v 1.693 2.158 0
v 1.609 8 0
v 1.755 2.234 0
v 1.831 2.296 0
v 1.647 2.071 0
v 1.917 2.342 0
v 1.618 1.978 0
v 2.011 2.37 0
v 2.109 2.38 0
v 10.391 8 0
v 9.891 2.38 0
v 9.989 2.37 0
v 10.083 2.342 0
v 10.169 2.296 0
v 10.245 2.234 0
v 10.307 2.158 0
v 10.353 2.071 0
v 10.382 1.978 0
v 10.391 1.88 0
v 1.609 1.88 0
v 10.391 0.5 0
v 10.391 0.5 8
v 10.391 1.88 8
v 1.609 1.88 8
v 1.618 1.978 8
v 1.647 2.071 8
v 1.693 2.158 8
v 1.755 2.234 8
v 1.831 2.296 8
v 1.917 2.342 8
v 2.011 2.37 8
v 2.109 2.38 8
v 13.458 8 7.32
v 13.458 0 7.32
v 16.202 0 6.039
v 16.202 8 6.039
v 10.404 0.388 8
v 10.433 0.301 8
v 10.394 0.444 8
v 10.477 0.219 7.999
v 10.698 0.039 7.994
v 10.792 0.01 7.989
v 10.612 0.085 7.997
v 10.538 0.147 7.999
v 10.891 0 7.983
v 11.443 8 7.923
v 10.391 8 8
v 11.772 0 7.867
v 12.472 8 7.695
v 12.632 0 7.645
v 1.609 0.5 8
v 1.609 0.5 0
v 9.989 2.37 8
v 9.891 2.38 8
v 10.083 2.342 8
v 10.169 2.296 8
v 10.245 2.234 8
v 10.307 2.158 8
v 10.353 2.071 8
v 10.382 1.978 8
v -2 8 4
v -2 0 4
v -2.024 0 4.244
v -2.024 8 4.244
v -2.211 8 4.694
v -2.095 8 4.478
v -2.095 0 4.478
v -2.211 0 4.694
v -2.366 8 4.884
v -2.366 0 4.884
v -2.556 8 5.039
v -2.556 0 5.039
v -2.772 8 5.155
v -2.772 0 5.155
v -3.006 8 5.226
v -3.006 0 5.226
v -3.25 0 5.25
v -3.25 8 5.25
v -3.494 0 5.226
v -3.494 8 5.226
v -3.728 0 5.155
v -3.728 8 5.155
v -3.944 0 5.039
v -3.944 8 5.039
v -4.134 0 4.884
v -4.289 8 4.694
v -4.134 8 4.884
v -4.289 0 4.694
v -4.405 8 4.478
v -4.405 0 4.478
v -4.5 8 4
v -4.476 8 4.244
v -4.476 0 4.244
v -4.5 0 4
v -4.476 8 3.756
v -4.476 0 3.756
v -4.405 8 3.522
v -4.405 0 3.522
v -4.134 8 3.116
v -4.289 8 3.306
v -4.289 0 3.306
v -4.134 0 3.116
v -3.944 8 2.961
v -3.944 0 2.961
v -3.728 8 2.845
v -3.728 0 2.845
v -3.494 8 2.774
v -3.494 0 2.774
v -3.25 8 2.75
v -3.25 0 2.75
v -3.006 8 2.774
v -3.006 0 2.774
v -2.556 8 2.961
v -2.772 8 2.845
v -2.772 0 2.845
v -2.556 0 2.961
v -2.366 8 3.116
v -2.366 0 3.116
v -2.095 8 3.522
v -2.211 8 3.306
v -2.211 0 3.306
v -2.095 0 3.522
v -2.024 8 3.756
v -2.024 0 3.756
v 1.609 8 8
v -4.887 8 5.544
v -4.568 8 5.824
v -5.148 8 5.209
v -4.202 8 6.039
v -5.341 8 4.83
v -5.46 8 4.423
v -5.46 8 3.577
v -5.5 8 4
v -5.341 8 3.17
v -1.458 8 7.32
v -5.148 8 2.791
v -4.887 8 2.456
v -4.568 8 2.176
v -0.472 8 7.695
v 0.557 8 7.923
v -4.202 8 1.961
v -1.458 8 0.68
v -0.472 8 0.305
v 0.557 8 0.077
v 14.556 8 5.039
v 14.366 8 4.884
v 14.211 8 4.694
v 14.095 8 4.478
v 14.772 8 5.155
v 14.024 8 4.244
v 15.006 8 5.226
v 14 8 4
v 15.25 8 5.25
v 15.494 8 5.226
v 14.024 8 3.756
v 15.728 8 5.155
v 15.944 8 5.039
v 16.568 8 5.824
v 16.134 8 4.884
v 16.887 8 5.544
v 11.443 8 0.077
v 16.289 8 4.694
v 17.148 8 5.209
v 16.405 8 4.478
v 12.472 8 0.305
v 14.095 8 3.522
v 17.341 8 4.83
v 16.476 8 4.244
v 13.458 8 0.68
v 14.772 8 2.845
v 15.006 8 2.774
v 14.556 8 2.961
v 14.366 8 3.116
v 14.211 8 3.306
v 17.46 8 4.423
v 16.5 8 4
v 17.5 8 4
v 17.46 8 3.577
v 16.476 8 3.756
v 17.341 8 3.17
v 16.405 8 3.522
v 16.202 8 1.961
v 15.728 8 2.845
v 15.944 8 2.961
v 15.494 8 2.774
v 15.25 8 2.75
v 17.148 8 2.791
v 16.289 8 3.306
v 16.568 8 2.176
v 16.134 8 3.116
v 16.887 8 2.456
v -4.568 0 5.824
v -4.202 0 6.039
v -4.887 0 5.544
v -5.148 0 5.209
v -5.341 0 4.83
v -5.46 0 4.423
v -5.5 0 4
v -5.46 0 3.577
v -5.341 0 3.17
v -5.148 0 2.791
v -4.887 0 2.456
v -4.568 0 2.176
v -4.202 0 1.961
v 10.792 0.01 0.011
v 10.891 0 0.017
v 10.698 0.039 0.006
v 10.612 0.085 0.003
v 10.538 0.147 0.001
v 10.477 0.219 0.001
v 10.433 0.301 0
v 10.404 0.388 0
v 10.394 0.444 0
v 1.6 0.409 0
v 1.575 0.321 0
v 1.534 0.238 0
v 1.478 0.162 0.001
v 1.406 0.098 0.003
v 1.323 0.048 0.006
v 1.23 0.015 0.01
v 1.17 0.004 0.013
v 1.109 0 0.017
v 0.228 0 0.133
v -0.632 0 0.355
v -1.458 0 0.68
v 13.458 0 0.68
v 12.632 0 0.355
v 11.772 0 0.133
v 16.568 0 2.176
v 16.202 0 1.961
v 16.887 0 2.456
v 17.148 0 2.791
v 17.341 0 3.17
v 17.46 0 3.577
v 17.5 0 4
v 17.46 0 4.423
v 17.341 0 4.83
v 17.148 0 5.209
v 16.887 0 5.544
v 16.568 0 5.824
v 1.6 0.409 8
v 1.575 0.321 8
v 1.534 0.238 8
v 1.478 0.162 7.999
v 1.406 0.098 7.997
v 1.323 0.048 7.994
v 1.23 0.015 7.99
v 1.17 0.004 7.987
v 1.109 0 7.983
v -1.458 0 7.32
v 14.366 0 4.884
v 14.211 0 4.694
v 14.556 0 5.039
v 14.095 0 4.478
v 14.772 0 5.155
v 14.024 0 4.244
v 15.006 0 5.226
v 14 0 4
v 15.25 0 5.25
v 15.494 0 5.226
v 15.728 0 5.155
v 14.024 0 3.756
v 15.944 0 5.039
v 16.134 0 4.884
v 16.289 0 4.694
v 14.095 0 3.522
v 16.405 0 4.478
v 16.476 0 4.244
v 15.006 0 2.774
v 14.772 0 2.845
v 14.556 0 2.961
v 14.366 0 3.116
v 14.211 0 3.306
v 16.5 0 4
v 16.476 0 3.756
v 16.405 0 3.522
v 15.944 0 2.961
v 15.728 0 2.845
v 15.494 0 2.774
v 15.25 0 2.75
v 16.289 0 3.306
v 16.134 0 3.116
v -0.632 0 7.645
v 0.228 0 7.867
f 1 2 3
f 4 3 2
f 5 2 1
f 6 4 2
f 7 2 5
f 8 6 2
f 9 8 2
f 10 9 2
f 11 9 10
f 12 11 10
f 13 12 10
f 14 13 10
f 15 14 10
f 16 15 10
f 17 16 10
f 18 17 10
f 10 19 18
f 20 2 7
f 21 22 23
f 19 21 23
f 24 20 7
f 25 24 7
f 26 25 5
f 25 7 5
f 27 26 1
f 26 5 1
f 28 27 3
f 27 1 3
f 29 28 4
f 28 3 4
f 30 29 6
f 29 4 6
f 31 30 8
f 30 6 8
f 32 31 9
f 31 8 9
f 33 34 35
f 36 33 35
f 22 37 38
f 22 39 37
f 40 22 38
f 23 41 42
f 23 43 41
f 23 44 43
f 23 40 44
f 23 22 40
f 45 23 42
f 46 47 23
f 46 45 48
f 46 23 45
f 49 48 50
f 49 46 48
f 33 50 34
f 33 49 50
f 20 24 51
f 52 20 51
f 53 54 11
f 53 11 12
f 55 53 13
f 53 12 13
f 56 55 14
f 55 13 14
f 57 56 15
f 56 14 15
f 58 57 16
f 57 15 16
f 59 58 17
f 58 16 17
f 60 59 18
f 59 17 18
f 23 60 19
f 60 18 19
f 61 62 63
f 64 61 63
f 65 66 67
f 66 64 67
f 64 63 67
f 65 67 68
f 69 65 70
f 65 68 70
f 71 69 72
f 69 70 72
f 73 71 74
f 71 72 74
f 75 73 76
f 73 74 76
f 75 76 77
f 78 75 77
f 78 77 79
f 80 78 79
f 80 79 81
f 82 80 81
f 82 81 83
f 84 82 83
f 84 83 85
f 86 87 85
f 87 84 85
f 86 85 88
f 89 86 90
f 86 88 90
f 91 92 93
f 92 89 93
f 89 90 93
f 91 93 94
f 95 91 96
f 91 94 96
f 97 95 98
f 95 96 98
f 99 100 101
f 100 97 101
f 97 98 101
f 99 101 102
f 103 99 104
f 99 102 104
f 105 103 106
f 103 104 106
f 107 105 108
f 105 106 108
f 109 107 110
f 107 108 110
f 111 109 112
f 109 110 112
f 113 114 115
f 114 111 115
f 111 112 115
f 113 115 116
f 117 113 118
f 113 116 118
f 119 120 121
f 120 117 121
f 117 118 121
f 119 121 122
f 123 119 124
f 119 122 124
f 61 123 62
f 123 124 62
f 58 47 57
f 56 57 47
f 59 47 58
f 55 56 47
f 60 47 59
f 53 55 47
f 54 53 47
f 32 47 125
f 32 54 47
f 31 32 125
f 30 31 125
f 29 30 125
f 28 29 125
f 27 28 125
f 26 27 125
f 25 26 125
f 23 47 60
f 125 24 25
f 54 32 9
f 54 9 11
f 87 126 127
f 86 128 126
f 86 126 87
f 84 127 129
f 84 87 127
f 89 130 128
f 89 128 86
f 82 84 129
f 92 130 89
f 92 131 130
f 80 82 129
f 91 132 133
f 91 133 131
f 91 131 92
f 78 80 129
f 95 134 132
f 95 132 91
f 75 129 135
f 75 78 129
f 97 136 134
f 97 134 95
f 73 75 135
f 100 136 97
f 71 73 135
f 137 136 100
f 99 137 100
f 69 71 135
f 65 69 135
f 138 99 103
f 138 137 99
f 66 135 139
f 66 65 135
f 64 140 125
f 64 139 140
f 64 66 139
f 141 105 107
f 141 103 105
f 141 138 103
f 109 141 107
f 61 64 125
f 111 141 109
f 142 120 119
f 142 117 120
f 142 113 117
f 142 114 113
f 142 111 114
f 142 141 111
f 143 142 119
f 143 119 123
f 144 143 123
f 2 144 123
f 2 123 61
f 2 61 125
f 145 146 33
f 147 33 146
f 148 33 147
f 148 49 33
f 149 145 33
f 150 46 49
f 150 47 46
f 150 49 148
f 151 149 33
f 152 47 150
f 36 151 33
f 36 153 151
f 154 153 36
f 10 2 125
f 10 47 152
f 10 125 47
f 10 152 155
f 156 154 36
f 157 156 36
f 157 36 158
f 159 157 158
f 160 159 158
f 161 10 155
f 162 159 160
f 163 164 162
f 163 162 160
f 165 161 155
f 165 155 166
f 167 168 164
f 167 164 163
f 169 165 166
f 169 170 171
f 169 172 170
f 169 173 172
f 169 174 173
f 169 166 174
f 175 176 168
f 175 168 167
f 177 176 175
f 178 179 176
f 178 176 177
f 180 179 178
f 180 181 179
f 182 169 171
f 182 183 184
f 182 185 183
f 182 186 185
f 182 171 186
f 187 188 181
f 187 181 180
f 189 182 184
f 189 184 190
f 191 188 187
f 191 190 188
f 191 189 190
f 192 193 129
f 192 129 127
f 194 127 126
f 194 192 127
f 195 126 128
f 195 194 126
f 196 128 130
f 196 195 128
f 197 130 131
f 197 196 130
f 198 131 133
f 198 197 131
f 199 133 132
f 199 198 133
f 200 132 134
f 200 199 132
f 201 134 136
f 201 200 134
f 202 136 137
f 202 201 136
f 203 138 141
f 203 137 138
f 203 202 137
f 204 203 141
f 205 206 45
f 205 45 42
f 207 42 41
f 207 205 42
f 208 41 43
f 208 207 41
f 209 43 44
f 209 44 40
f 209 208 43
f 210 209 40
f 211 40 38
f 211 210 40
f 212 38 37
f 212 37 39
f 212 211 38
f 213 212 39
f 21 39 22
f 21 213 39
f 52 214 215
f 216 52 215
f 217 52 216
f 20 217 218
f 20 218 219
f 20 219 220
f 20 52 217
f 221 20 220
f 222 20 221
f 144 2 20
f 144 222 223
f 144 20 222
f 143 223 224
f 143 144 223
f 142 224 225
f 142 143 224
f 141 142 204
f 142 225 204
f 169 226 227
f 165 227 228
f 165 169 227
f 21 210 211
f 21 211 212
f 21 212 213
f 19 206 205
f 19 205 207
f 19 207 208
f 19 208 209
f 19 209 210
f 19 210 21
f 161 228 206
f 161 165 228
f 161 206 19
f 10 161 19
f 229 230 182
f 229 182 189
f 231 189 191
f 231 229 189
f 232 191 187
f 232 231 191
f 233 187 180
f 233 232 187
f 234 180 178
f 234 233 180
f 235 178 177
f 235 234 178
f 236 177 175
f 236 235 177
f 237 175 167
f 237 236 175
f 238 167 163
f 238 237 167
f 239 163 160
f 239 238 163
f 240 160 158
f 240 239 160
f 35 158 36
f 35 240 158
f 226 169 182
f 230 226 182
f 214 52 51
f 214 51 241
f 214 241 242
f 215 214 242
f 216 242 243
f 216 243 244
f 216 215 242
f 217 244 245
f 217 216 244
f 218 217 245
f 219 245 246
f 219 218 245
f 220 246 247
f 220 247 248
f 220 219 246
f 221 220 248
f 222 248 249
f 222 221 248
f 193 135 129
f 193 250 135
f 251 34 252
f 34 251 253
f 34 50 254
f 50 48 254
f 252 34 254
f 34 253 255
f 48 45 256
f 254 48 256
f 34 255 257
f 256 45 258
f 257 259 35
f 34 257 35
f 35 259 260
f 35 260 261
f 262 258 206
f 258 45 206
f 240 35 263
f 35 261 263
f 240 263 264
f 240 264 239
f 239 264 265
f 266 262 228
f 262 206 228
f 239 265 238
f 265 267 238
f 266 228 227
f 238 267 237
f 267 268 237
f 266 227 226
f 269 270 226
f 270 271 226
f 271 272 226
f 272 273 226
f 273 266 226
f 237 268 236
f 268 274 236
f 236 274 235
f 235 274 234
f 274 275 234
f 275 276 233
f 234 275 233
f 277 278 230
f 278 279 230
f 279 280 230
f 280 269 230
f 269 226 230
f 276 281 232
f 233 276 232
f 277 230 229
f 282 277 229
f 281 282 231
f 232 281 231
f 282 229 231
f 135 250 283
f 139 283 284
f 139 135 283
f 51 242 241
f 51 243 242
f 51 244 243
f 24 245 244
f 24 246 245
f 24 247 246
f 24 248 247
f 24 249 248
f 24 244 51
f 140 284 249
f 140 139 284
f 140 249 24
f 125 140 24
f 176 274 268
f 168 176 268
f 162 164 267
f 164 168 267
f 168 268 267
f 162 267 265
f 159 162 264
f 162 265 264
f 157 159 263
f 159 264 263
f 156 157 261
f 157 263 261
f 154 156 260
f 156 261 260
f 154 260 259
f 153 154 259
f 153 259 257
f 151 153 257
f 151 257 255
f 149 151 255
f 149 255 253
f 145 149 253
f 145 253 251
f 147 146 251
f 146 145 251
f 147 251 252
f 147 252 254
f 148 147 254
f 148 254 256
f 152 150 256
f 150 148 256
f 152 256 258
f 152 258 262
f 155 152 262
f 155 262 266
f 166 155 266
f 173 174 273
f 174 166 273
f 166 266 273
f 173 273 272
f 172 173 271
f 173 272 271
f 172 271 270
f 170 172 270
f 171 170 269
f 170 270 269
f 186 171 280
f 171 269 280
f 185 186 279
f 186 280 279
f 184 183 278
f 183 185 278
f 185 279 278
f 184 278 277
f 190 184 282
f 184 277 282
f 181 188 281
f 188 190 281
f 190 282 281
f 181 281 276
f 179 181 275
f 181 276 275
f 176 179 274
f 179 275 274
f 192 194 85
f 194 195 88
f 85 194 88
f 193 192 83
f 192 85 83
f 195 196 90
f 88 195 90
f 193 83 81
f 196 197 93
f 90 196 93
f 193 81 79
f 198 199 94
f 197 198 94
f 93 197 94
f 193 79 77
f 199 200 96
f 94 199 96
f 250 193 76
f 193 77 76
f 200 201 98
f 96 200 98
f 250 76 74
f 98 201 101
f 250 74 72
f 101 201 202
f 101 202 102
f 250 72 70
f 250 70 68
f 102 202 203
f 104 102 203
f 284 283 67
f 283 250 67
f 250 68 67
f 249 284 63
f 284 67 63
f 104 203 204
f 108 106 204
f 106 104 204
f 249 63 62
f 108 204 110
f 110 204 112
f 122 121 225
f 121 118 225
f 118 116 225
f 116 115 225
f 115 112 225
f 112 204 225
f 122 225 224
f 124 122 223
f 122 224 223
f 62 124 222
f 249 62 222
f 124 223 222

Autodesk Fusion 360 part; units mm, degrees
sketch "Sketch1" plane through (0, 0, 0) normal (0, 1, 0) x (1, 0, 0) in component "CableClamp"
  line L0 (0, 0) -> (12, 0)
  line L1 (12, 0) -> (12, -8) construction
  line L2 (12, -8) -> (0, -8)
  line L3 (0, -8) -> (0, 0) construction
  circle A0 centre (15.25, -4) radius 1.25
  circle A1 centre (15.25, -4) radius 2.25
  line L4 (12, -4) -> (13, -4) construction
  line L5 (12, 0) -> (16.2016, -1.9612)
  line L6 (12, -8) -> (16.2016, -6.0388)
  circle A2 centre (-3.25, -4) radius 1.25
  circle A3 centre (-3.25, -4) radius 2.25
  line L7 (0, -4) -> (-1, -4) construction
  line L8 (0, -8) -> (-4.2016, -6.0388)
  line L9 (0, 0) -> (-4.2016, -1.9612)
  dimension "d5" = 12
  dimension "d6" = 8
  dimension "d7" = 2.5
  dimension "d10" = 1
  dimension "d11" = 1
  dimension "d12" = 2.5
  dimension "d13" = 1
  dimension "d14" = 1
extrude "Extrude1" add sketch "Sketch1" along normal blind 8 in component "CableClamp"
fillet "Fillet1" radius 7.25 4 edges at (0, 4, 0) (12, 4, 0) (12, 4, 8) (0, 4, 8) in component "CableClamp"
sketch "Sketch1 (1)" plane through (0, 0, 8) normal (0, 0, 1) x (1, 0, 0) in component "CableClamp"
  line L0 (1.6087, 8) -> (1.6087, 0)
  line L1 (1.6087, 0) -> (10.3913, 0)
  line L2 (10.3913, 0) -> (10.3913, 8)
  line L3 (10.3913, 8) -> (1.6087, 8)
  line L4 (1.6087, 2.38) -> (10.3913, 2.38)
  dimension "d31" = 2.38
extrude "Extrude2" cut sketch "Sketch1 (1)" against normal through all contours L0 L1 L2 L4 in component "CableClamp"
fillet "Fillet1'" radius 0.5 4 edges at (1.6087, 2.38, 4) (1.6087, 0, 4) (10.3913, 0, 4) (10.3913, 2.38, 4) in component "CableClamp"
component "CableClamp" placed x (1, 0, 0) y (0, 1, 0) z (0, 0, 1) at (0, 0, 0)
equation "width = 12 mm"
equation "height = 8 mm"
equation "screwHoleDiamerter = 2.5 mm"
equation "screwHoleWallThickness = 1 mm"
equation "d5 = width"
equation "d6 = height"
equation "d7 = screwHoleDiamerter"
equation "d10 = screwHoleWallThickness"
equation "d12 = screwHoleDiamerter"
equation "d13 = screwHoleWallThickness"
equation "thickness = 8 mm"
equation "d16 = thickness"
equation "cableDiameter = 3.4 mm"
equation "clampRatio = 0.7" comment "The closer to 0, the tighter the grip."
equation "d31 = cableDiameter * clampRatio"
